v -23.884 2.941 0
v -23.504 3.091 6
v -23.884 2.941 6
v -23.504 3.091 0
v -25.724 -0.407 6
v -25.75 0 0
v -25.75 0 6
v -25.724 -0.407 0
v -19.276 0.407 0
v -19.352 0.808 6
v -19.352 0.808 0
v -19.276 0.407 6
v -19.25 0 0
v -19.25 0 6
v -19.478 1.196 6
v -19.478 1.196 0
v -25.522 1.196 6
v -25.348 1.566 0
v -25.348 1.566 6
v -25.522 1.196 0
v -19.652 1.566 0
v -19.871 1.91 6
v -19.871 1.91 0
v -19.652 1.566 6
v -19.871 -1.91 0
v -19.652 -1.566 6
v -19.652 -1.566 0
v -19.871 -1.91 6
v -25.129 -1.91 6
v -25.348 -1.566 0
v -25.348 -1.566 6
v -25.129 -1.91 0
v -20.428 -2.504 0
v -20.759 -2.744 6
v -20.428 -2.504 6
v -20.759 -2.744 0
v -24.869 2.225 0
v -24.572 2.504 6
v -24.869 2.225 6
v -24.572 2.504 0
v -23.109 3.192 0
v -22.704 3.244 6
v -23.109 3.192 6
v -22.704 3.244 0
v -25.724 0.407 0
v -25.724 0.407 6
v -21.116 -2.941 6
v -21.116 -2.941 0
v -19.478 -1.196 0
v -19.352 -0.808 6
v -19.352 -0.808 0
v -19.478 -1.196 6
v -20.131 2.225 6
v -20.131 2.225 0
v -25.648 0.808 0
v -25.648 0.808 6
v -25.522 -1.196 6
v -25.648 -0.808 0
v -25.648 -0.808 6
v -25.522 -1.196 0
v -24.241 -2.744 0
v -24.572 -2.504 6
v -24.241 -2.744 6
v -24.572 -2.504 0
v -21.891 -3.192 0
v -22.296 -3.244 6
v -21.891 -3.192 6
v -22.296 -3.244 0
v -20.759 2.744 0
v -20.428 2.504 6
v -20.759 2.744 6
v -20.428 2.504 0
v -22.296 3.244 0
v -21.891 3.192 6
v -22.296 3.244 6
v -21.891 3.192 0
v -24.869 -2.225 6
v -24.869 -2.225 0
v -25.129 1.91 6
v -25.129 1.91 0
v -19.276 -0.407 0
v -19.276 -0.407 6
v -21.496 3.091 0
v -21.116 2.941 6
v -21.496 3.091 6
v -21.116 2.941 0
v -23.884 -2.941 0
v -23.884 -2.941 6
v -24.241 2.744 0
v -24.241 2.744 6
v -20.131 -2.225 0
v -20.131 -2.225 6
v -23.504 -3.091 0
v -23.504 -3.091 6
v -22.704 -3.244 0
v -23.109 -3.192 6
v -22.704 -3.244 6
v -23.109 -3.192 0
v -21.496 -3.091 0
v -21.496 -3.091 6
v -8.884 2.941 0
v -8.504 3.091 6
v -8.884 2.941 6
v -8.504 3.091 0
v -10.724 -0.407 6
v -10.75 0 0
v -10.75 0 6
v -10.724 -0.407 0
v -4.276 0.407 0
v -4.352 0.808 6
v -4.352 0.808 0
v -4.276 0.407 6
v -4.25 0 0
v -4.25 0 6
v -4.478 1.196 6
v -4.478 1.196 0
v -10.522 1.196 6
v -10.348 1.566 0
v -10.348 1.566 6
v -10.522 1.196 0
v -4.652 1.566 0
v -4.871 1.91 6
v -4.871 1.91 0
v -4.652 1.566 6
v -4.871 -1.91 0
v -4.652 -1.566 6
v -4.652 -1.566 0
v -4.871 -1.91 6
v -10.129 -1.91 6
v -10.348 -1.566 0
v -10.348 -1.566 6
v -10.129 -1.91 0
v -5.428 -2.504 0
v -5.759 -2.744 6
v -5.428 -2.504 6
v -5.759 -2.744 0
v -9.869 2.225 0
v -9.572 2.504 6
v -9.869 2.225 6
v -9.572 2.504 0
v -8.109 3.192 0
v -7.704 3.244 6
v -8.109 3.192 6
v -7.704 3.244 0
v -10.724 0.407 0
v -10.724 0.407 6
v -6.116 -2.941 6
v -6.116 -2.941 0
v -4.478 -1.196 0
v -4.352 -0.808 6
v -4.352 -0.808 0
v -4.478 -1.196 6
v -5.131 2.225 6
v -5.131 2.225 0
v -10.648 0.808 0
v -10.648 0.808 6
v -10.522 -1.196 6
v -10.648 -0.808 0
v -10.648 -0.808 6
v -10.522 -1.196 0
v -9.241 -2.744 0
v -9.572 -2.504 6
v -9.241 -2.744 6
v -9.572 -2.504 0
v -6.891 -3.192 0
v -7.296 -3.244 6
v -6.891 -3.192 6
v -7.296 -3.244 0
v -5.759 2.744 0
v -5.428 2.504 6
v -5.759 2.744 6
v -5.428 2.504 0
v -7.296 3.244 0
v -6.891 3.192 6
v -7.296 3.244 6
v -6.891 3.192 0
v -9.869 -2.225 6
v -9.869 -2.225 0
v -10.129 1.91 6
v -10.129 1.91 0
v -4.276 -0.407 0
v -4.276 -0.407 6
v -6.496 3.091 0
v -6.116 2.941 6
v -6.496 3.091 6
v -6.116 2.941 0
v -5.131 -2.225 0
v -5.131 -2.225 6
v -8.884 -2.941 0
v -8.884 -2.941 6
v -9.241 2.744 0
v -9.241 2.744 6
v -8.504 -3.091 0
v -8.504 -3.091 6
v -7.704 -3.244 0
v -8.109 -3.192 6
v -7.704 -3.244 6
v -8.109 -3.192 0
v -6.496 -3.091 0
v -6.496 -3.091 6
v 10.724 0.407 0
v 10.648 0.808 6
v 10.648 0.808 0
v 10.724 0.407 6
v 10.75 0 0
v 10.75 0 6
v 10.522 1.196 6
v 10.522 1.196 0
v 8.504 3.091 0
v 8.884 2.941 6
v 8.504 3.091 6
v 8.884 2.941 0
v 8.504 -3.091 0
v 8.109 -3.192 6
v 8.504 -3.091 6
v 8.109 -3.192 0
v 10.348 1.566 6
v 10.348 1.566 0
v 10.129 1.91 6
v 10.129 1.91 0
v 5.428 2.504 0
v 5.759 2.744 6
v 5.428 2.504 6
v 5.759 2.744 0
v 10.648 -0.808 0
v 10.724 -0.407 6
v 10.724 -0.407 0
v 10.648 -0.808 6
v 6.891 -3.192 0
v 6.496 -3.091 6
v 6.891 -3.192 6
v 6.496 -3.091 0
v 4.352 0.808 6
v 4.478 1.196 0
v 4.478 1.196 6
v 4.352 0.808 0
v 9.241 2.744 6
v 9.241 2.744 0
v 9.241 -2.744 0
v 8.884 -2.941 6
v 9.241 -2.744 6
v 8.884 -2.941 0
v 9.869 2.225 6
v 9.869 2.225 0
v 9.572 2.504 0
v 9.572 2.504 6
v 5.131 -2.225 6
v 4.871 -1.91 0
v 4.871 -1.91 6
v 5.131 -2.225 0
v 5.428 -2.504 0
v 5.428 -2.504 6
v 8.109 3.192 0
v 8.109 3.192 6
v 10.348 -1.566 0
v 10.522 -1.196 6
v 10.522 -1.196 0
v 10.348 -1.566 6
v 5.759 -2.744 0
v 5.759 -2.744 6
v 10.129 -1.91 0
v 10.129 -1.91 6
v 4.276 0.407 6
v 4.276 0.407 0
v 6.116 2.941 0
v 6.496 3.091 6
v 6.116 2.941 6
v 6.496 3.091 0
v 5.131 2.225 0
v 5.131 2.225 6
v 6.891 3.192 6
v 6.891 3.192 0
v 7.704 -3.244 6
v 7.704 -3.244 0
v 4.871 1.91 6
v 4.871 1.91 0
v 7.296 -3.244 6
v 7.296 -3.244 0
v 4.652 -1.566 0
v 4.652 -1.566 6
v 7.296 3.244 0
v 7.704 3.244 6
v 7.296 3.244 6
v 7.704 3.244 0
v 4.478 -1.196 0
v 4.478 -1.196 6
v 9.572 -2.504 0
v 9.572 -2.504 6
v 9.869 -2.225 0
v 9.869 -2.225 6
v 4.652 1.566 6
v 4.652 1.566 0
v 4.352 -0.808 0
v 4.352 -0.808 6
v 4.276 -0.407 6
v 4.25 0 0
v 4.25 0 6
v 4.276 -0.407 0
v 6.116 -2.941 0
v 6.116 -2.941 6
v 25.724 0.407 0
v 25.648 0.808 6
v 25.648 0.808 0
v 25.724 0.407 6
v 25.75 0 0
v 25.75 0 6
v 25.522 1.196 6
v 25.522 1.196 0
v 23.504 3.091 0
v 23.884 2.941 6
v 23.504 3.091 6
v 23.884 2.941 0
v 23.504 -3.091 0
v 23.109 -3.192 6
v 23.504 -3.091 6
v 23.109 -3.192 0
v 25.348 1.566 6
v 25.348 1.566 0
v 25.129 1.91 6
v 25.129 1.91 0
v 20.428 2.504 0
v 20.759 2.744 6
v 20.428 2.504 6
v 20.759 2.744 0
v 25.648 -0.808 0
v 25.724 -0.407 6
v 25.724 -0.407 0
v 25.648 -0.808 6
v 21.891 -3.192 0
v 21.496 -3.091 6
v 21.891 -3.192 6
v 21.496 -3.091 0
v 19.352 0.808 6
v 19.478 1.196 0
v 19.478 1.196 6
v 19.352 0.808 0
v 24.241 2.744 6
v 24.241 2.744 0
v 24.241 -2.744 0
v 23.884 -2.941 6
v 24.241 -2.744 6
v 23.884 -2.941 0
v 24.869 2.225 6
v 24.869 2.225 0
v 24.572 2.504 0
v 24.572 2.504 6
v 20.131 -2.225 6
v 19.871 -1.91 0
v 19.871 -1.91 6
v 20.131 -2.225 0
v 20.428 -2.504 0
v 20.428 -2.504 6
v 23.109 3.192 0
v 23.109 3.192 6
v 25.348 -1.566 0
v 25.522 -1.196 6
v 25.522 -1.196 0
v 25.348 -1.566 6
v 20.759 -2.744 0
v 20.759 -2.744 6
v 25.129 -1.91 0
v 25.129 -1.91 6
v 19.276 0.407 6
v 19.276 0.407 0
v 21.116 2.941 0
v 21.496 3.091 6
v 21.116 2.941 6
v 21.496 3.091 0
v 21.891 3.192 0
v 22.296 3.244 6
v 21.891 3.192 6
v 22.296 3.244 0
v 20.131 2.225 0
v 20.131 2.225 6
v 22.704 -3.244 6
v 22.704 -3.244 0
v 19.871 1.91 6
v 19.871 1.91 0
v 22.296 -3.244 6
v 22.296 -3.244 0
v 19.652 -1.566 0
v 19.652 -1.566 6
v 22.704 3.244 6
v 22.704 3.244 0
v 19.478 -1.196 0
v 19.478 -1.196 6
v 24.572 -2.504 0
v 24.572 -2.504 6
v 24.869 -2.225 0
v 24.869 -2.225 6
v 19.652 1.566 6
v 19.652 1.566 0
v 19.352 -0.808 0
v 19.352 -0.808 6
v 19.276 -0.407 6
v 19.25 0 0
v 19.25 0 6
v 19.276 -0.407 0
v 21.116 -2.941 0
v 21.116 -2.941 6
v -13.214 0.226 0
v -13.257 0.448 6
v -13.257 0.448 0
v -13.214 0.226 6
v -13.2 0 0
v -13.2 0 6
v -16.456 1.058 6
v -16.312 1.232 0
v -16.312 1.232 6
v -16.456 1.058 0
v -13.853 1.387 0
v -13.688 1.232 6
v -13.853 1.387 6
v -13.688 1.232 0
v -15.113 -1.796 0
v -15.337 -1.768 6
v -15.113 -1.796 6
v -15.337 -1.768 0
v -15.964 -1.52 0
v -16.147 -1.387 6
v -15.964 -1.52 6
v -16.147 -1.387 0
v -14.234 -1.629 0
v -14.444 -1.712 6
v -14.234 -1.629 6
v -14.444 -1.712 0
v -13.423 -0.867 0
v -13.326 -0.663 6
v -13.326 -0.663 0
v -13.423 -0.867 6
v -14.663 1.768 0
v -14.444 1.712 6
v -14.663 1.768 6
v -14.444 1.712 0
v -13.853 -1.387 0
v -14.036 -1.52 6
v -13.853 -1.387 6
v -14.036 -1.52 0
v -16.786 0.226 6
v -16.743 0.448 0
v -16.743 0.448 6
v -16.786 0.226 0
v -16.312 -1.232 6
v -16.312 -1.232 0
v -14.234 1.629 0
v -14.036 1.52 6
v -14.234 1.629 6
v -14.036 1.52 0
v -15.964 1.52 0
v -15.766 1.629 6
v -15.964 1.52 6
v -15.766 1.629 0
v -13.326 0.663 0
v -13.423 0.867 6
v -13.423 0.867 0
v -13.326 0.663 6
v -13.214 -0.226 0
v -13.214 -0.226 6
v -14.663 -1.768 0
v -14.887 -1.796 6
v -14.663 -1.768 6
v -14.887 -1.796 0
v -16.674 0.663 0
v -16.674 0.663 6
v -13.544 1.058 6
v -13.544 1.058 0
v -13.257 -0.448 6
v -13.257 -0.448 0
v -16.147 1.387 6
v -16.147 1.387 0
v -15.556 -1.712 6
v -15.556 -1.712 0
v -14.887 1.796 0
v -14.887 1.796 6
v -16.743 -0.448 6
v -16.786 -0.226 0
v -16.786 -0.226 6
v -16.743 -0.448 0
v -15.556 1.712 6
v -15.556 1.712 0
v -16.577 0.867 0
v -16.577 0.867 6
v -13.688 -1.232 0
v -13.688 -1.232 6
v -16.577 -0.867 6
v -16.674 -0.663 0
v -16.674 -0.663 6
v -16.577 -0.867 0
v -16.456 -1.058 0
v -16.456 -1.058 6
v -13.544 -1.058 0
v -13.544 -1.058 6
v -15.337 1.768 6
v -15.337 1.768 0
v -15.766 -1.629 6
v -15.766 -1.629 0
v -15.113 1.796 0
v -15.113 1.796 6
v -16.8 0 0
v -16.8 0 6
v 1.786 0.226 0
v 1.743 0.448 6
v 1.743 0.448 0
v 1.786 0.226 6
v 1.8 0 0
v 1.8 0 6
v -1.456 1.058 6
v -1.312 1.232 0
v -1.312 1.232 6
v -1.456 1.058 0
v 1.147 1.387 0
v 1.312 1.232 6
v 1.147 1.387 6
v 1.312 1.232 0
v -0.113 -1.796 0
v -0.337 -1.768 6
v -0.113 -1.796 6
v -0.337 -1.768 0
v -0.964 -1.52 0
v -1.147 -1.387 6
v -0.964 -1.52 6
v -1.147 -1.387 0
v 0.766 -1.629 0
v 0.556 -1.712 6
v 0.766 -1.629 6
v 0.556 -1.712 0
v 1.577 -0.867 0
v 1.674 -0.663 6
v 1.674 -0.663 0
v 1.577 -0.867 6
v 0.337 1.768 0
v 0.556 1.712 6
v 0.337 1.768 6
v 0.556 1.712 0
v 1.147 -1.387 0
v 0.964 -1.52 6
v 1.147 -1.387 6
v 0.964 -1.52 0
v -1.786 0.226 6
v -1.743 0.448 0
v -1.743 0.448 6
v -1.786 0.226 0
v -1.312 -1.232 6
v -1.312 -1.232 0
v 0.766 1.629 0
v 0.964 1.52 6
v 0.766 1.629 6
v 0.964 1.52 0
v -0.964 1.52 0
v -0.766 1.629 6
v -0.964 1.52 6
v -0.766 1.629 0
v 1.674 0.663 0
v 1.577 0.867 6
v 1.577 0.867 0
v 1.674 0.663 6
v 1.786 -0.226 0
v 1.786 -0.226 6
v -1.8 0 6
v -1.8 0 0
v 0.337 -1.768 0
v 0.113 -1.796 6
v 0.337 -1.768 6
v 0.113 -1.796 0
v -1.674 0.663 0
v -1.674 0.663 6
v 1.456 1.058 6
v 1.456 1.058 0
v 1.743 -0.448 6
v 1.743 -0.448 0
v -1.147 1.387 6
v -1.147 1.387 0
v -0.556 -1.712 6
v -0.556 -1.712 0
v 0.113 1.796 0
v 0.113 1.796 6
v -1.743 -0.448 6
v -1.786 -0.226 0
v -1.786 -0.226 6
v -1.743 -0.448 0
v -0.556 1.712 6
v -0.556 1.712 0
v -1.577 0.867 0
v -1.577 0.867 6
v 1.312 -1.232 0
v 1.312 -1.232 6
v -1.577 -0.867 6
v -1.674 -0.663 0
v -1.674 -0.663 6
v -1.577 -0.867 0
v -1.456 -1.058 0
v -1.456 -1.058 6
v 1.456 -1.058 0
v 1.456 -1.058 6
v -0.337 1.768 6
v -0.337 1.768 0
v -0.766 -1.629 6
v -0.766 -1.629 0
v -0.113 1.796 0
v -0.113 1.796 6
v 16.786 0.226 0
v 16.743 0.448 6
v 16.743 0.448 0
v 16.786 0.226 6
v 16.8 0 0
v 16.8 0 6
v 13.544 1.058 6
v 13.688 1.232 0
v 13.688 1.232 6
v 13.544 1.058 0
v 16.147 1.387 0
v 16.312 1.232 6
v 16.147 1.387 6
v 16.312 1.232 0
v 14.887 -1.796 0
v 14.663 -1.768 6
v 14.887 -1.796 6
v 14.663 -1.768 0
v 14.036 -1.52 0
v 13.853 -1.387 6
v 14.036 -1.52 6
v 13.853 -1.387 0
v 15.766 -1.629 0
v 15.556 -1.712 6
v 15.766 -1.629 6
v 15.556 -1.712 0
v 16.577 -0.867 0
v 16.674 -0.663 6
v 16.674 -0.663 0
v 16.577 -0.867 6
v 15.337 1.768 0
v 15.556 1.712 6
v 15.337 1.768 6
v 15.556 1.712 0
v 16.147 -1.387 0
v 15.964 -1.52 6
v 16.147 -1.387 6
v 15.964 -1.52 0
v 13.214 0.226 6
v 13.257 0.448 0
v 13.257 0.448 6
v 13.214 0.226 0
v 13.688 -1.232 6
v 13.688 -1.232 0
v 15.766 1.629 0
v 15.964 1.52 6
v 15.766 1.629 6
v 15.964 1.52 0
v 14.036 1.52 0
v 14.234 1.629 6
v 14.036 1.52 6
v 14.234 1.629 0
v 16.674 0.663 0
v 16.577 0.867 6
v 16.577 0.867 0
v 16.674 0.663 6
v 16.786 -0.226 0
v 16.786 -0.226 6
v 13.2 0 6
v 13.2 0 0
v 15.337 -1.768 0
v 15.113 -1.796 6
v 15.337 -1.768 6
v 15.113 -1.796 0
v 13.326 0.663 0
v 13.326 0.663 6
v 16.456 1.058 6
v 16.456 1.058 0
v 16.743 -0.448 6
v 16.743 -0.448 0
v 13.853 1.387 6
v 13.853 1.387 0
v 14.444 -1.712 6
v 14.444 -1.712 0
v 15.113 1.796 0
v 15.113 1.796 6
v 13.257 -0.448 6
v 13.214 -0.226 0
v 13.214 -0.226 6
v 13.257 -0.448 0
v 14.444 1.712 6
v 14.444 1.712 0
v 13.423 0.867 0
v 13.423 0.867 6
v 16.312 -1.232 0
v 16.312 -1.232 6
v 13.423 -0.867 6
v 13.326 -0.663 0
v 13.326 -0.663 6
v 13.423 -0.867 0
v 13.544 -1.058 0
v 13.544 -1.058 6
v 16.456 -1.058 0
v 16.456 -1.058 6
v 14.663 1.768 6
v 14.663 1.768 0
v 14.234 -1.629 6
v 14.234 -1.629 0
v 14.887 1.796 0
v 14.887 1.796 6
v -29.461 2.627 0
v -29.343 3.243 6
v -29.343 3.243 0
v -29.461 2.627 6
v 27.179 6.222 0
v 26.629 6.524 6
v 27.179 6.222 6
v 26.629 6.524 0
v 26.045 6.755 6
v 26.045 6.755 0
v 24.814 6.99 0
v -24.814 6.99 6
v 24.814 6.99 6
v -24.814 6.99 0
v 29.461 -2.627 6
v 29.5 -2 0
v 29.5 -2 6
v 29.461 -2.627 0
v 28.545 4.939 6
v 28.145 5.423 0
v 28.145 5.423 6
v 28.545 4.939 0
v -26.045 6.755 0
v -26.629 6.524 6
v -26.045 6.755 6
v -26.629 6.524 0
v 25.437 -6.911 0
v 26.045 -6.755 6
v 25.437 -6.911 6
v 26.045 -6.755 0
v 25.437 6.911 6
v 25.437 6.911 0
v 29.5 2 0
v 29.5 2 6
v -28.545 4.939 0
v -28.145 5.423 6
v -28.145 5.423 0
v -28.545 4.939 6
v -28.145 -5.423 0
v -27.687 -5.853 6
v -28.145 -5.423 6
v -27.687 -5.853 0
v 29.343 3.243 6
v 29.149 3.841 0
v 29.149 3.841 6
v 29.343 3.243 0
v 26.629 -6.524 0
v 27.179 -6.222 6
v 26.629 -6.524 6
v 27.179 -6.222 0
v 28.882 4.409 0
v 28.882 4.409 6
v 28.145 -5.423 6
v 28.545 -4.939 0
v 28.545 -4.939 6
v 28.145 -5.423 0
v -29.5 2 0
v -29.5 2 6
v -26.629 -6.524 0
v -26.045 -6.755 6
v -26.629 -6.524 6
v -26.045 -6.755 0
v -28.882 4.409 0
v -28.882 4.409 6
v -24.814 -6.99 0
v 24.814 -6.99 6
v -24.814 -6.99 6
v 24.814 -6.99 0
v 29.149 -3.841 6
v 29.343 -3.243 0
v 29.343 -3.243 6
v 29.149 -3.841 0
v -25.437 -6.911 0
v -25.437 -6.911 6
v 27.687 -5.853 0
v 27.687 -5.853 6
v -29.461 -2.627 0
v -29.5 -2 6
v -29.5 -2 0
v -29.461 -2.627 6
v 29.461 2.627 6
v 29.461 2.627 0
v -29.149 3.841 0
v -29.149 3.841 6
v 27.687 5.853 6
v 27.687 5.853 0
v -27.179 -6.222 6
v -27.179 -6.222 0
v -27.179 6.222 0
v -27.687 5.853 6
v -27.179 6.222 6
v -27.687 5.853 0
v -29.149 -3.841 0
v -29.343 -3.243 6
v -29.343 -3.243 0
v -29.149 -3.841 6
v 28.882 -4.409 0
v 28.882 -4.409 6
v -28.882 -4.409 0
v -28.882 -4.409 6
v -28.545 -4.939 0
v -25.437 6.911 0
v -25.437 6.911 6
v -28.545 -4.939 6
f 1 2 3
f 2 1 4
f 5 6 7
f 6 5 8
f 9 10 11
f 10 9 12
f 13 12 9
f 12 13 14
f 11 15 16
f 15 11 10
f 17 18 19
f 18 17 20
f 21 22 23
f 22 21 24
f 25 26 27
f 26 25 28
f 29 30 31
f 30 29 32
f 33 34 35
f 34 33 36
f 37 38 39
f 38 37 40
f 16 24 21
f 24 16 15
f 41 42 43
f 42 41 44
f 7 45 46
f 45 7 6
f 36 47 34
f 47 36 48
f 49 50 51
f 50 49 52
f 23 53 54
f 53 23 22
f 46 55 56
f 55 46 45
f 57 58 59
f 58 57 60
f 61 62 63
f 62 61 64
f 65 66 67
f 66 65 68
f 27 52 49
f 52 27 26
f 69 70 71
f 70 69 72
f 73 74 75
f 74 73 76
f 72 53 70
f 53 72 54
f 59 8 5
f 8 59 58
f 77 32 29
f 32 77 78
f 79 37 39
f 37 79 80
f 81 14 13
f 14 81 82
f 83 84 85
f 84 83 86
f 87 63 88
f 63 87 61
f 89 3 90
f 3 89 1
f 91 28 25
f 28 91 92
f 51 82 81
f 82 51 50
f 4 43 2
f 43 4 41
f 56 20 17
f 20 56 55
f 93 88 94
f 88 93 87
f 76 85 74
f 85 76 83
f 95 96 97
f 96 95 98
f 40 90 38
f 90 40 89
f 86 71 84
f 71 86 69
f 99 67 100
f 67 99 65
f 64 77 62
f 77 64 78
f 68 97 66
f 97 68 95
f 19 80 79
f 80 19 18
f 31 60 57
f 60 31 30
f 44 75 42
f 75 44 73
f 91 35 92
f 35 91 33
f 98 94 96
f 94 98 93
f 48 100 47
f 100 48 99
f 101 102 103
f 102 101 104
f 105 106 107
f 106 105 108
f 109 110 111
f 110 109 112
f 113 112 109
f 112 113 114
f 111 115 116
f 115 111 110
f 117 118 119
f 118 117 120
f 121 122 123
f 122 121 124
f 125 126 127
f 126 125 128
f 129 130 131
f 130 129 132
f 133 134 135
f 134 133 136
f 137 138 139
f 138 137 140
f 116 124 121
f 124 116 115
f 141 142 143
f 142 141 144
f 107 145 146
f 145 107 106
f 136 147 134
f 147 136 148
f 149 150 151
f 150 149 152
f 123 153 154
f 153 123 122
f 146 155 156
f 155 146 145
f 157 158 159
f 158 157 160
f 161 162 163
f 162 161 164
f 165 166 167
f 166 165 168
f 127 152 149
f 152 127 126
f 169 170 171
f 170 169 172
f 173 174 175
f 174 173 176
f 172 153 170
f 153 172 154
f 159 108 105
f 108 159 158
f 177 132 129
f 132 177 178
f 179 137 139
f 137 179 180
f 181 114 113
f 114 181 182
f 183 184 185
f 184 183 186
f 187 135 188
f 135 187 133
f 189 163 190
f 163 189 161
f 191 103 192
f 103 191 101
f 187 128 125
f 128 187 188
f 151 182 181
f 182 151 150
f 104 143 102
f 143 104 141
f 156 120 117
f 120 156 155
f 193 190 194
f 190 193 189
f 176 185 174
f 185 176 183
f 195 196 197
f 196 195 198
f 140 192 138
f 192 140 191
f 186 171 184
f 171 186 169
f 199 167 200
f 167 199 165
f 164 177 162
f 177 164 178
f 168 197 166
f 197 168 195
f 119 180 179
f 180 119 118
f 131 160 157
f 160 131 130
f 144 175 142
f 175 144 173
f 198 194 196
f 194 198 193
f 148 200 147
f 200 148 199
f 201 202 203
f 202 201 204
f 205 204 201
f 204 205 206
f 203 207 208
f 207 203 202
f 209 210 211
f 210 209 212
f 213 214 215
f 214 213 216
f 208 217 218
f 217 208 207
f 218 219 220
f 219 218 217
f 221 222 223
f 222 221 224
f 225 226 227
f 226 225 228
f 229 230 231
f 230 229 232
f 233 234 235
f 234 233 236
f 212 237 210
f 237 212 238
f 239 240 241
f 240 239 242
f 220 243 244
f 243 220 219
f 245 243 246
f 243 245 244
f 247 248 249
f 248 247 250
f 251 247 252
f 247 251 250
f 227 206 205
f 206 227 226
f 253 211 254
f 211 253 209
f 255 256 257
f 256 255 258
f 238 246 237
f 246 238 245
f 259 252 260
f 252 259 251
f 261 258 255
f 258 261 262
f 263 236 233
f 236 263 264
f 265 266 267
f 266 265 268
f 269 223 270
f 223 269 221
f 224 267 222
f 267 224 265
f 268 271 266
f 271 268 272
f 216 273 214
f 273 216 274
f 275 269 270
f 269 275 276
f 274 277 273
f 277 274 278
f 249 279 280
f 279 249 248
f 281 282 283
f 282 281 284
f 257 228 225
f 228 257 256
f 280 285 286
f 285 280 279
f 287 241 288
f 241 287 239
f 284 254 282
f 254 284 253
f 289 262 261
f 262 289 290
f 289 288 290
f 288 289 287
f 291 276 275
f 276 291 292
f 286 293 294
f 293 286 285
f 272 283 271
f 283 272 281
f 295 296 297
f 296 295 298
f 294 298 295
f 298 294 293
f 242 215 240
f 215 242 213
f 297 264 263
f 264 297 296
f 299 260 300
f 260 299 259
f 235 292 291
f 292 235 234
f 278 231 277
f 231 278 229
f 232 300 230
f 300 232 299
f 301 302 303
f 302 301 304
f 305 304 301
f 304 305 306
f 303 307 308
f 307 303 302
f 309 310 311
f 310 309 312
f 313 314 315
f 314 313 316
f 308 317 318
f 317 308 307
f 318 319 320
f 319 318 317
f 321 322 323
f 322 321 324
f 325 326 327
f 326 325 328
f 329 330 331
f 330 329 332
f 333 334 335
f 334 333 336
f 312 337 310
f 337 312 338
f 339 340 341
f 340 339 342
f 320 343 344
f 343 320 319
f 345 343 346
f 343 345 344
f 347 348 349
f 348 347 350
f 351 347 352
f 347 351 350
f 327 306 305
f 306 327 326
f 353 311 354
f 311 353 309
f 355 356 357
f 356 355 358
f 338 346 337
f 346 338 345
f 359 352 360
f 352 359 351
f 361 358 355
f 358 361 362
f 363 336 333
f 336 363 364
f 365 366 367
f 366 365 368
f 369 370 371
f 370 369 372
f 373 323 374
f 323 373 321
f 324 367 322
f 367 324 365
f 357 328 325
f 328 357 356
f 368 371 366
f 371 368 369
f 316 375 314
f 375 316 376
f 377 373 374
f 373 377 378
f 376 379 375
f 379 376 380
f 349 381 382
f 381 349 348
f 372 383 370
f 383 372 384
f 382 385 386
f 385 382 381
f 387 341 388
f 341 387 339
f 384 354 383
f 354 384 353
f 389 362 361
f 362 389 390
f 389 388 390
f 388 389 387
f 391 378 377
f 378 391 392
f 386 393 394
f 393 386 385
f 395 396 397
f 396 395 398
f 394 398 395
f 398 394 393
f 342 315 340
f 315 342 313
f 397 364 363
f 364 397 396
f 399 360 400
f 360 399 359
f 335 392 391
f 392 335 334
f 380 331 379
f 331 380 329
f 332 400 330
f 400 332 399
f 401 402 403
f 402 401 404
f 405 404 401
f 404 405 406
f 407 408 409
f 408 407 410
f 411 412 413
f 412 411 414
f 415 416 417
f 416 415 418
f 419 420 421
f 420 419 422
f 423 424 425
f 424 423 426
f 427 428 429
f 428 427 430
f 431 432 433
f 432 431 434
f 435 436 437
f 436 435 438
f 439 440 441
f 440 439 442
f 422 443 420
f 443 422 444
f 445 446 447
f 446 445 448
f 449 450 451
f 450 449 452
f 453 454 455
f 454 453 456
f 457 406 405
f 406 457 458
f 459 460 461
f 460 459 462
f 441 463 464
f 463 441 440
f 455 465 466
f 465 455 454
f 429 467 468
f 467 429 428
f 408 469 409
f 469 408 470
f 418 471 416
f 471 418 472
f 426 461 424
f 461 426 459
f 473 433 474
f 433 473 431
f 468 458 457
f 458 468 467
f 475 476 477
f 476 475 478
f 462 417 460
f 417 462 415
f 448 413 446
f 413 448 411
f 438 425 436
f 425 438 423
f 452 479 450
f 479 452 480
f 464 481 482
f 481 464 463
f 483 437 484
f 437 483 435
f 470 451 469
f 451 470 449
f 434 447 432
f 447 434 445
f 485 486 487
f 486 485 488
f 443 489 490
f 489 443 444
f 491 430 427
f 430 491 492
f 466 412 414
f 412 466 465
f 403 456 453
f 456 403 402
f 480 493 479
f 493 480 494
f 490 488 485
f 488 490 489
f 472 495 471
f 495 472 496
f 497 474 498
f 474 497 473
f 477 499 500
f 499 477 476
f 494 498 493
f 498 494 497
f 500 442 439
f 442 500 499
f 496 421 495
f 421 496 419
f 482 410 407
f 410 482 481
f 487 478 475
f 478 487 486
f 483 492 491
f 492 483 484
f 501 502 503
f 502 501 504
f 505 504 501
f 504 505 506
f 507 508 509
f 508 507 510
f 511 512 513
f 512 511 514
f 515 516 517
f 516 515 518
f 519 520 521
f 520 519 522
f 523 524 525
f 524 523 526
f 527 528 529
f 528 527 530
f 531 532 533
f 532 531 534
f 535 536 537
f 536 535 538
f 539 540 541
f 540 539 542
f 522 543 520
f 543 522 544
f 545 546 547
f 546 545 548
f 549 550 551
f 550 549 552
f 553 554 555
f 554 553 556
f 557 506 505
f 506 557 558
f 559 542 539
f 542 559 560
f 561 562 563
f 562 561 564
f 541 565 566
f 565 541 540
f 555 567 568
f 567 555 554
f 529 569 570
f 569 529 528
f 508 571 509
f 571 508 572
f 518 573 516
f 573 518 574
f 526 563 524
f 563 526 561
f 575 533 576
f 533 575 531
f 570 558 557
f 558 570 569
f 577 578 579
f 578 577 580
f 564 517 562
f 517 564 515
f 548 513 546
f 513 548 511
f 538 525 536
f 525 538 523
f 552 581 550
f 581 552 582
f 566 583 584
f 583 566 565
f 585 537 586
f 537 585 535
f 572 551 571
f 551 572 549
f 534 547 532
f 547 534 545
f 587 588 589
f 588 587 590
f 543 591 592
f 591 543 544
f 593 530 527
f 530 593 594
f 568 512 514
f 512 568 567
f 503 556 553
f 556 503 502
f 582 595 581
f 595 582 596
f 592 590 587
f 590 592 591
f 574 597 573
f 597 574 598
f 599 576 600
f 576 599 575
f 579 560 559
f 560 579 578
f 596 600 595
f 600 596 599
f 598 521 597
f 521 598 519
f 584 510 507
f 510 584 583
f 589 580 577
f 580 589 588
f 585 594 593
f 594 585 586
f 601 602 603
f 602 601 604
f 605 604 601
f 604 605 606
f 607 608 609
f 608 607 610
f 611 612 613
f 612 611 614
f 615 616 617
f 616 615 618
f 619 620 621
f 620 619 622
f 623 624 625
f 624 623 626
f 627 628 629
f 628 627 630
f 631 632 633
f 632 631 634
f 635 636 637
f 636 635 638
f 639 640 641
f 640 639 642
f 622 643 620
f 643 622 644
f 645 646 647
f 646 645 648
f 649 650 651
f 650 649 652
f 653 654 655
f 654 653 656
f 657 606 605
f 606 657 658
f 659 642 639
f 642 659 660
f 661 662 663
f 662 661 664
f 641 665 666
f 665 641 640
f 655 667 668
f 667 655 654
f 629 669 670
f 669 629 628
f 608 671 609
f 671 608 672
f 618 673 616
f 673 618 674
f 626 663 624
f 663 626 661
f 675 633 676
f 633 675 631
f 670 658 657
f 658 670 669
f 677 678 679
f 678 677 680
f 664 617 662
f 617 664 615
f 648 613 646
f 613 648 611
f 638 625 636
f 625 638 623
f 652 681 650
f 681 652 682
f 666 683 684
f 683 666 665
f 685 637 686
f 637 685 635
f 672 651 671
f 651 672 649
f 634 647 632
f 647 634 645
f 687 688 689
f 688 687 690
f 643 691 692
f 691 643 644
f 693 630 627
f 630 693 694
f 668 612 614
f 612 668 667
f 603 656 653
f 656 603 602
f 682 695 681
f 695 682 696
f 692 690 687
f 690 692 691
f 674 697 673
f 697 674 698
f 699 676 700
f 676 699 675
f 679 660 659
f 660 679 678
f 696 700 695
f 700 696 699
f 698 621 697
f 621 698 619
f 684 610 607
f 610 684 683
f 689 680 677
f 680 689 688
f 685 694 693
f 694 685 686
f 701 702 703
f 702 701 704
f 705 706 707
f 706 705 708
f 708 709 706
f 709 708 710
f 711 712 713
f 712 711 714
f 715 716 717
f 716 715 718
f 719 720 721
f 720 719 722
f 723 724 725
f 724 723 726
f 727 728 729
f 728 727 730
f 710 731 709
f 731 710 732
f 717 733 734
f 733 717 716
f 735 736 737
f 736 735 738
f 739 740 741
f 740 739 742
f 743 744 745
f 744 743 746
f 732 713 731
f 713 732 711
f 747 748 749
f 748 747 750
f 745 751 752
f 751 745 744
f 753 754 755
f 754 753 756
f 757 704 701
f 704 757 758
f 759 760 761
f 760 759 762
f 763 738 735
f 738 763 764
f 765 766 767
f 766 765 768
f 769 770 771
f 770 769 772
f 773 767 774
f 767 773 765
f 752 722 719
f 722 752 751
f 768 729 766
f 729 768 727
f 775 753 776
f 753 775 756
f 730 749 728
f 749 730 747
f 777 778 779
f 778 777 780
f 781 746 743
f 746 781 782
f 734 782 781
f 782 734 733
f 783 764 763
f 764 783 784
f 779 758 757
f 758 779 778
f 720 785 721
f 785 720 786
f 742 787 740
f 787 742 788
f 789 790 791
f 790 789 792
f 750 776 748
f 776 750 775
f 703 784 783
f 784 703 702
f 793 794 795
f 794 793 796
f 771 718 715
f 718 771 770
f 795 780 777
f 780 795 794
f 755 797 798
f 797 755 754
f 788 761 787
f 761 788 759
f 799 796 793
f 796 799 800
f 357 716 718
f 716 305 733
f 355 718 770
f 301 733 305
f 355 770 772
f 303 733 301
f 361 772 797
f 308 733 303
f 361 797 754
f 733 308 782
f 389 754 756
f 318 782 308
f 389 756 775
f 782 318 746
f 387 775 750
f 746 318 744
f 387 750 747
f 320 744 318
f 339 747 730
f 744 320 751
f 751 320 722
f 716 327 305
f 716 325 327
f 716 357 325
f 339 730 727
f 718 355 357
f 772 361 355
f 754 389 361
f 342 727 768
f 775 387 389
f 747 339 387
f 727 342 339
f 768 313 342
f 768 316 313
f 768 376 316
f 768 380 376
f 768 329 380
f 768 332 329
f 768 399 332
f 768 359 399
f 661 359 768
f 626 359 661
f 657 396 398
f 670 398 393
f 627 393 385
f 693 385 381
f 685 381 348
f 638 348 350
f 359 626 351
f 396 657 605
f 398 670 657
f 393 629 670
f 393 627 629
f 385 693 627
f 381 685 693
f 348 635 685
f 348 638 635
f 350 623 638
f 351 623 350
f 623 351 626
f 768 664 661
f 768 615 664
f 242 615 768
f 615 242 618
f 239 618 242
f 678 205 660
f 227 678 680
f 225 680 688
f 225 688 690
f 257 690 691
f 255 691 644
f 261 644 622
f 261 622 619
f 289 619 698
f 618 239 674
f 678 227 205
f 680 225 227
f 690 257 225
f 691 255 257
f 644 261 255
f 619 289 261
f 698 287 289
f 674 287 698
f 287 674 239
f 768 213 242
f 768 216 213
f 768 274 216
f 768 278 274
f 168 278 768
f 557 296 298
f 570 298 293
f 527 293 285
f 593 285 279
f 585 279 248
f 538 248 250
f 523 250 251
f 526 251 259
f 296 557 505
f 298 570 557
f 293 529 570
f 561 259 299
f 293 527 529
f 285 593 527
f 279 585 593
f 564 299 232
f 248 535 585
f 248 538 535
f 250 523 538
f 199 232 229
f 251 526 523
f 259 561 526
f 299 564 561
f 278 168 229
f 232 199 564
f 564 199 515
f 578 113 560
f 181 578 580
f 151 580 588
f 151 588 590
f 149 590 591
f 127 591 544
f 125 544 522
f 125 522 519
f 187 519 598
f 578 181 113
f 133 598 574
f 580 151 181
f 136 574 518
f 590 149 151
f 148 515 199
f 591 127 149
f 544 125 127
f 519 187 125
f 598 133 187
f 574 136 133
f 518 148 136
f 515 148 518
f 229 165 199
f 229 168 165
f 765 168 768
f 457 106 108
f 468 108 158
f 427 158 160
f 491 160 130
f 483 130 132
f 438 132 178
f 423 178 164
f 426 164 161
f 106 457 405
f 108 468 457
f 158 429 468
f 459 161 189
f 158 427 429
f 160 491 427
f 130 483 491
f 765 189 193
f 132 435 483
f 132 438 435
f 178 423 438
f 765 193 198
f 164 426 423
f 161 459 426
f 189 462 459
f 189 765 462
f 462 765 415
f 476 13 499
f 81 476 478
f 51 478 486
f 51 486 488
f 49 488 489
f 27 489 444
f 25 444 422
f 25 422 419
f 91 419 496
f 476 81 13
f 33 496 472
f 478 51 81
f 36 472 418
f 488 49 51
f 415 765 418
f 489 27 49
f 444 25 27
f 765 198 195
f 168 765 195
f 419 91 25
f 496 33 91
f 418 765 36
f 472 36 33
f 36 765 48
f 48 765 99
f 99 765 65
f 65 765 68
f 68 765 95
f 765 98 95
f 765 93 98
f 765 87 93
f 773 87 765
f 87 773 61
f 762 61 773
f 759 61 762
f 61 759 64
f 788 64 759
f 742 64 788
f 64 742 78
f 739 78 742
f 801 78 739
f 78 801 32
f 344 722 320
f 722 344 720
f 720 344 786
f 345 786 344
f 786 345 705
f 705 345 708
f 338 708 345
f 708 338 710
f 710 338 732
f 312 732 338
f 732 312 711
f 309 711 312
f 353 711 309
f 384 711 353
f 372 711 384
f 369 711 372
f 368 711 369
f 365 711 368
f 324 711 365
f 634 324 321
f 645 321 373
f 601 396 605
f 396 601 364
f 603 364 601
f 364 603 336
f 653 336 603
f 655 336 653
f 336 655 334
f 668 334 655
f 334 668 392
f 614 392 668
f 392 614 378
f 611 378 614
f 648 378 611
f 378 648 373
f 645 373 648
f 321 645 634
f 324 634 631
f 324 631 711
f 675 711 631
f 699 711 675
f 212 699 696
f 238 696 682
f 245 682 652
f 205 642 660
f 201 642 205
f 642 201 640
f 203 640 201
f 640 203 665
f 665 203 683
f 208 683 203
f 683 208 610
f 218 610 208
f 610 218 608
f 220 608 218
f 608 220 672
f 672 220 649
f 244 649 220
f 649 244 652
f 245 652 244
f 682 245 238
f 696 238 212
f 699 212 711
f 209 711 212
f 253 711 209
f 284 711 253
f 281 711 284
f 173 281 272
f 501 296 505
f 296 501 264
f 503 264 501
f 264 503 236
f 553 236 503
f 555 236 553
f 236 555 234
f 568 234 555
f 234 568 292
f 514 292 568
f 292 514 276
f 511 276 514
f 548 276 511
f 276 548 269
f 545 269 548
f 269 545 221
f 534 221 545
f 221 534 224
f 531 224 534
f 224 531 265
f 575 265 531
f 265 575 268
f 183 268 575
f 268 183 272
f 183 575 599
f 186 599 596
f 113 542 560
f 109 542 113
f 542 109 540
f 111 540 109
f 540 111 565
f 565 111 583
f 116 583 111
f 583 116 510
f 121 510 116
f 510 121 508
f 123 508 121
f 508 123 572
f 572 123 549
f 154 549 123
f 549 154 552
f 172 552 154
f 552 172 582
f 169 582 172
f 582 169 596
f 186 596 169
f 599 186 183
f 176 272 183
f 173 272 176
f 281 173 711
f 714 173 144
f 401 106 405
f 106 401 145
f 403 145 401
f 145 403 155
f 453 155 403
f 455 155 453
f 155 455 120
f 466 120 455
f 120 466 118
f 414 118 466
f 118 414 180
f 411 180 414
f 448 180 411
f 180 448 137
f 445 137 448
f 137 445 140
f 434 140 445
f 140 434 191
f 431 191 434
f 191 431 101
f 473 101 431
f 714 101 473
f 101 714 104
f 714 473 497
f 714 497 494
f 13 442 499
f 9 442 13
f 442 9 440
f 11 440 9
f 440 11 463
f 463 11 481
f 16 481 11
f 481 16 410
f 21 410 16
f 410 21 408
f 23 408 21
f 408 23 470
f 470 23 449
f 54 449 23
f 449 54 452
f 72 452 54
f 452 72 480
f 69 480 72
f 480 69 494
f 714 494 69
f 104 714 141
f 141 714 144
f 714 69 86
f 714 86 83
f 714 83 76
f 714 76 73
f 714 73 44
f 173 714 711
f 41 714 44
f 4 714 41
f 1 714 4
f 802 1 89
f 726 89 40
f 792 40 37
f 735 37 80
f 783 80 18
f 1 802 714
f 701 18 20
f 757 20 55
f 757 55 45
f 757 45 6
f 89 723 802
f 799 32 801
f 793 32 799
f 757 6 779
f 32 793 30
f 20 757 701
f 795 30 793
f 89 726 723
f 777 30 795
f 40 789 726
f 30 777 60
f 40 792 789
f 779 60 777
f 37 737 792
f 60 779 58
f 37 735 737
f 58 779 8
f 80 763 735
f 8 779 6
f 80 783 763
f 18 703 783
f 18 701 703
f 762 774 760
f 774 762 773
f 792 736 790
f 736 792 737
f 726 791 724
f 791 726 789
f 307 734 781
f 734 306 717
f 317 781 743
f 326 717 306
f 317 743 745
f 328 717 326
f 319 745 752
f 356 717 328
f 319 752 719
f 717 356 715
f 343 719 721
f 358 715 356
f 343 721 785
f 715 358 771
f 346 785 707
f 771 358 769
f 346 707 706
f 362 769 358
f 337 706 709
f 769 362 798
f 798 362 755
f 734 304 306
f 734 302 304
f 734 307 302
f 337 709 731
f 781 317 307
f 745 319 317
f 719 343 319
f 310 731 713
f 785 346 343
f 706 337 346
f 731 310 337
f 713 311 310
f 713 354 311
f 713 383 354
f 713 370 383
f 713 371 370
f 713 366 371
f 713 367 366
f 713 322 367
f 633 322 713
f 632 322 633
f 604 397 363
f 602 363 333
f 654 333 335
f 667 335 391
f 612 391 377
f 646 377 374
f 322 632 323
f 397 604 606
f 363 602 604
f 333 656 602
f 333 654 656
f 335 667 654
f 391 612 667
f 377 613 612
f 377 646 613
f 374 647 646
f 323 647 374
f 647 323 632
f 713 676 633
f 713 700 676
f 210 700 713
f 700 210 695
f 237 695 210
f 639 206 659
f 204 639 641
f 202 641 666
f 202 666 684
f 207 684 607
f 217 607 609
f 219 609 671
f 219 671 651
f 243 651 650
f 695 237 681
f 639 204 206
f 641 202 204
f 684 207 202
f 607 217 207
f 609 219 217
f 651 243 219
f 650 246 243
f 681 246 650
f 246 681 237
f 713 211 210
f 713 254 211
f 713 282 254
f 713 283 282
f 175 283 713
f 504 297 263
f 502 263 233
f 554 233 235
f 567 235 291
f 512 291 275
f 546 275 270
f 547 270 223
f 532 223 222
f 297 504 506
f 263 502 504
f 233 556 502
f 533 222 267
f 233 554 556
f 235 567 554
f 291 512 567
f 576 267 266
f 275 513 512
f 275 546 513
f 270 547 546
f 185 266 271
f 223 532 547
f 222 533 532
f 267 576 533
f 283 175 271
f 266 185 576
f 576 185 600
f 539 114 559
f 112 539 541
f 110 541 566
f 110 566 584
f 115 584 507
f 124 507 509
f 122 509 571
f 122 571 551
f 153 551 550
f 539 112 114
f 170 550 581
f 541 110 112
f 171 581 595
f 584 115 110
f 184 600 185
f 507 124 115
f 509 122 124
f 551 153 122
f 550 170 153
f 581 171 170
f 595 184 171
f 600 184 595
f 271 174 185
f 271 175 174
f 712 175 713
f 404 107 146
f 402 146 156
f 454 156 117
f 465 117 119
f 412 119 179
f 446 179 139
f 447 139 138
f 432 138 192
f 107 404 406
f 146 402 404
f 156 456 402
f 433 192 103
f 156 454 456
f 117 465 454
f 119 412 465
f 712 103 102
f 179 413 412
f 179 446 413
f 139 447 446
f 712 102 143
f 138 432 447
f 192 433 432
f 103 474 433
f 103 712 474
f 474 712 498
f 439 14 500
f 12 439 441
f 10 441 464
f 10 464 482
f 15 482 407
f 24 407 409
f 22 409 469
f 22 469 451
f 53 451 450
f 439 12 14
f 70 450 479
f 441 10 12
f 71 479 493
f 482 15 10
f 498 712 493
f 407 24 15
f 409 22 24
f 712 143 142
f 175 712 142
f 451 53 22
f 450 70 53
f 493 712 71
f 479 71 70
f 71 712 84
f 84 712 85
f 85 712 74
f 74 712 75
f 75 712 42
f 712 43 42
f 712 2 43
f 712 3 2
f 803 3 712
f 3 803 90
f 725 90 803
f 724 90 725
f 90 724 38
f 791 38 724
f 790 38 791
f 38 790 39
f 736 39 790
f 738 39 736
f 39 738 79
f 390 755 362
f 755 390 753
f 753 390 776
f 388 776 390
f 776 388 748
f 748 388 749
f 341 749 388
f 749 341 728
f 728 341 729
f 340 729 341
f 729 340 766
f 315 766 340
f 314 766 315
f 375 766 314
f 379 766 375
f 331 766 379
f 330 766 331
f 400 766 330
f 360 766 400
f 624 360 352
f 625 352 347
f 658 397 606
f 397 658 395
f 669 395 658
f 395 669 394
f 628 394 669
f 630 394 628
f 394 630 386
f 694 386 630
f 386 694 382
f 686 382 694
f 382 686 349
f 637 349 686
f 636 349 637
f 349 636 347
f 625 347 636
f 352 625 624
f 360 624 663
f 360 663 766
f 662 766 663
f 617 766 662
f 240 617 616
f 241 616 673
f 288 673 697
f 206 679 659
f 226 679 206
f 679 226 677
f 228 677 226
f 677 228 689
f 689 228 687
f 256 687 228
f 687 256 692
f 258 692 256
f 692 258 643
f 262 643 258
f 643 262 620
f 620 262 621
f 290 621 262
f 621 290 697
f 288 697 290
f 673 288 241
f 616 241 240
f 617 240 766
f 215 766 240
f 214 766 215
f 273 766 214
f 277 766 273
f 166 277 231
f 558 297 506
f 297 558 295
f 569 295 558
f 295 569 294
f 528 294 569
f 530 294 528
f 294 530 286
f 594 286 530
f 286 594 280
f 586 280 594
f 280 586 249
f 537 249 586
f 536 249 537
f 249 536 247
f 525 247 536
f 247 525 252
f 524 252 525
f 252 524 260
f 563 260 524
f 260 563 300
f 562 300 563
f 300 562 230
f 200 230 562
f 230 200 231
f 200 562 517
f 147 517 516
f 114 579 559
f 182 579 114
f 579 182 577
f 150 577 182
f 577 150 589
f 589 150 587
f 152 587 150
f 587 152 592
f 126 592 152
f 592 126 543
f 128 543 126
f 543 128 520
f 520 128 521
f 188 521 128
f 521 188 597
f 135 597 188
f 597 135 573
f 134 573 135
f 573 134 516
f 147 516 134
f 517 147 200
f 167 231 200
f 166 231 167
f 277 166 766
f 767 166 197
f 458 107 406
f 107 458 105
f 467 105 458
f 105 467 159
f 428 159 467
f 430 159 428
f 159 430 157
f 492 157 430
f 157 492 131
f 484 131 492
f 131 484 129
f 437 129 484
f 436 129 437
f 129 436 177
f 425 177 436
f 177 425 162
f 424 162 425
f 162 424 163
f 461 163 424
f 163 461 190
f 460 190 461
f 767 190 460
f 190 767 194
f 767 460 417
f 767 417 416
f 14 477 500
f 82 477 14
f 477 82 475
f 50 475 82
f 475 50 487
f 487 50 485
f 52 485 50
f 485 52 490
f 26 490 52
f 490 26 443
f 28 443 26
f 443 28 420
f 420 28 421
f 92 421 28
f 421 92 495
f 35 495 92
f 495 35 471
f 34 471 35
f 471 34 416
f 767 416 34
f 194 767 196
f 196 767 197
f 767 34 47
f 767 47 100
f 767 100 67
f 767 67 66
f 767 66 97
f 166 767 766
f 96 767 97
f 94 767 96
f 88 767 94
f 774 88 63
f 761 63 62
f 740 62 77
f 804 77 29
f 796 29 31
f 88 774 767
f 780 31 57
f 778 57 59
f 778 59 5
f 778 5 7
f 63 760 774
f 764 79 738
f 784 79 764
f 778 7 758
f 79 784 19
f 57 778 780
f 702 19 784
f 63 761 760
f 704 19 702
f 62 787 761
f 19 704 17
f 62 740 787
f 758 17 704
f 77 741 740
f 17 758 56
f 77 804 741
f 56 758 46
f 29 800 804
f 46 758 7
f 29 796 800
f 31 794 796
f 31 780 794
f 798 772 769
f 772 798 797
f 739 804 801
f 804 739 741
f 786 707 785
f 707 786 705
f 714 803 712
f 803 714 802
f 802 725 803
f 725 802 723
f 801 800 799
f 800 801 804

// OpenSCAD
$fn = 50;


difference() {
	union() {
		*color(alpha = 1.0000000000, c = "gray") {
			translate(v = [0, 7, 0]) {
				linear_extrude(height = 1) {
					text(font = "Arial:style=Bold", halign = "center", size = 4.5000000000, text = "COMMENT plate main", valign = "center");
				}
			}
		}
		hull() {
			translate(v = [-24.5000000000, 2.0000000000, 0]) {
				cylinder(h = 6, r = 5);
			}
			translate(v = [24.5000000000, 2.0000000000, 0]) {
				cylinder(h = 6, r = 5);
			}
			translate(v = [-24.5000000000, -2.0000000000, 0]) {
				cylinder(h = 6, r = 5);
			}
			translate(v = [24.5000000000, -2.0000000000, 0]) {
				cylinder(h = 6, r = 5);
			}
		}
	}
	union() {
		*color(alpha = 1.0000000000, c = "gray") {
			translate(v = [0, 7, 0]) {
				linear_extrude(height = 1) {
					text(font = "Arial:style=Bold", halign = "center", size = 4.5000000000, text = "COMMENT holes main", valign = "center");
				}
			}
		}
		translate(v = [-22.5000000000, 0.0000000000, 0]) {
			translate(v = [0, 0, -100]) {
				cylinder(h = 200, r = 3.2500000000);
			}
		}
		translate(v = [-7.5000000000, 0.0000000000, 0]) {
			translate(v = [0, 0, -100]) {
				cylinder(h = 200, r = 3.2500000000);
			}
		}
		translate(v = [7.5000000000, 0.0000000000, 0]) {
			translate(v = [0, 0, -100]) {
				cylinder(h = 200, r = 3.2500000000);
			}
		}
		translate(v = [22.5000000000, 0.0000000000, 0]) {
			translate(v = [0, 0, -100]) {
				cylinder(h = 200, r = 3.2500000000);
			}
		}
		translate(v = [-22.5000000000, 0.0000000000, 0]) {
			translate(v = [0, 0, -100]) {
				cylinder(h = 200, r = 1.8000000000);
			}
		}
		translate(v = [-15.0000000000, 0.0000000000, 0]) {
			translate(v = [0, 0, -100]) {
				cylinder(h = 200, r = 1.8000000000);
			}
		}
		translate(v = [-7.5000000000, 0.0000000000, 0]) {
			translate(v = [0, 0, -100]) {
				cylinder(h = 200, r = 1.8000000000);
			}
		}
		translate(v = [0, 0, -100]) {
			cylinder(h = 200, r = 1.8000000000);
		}
		translate(v = [7.5000000000, 0.0000000000, 0]) {
			translate(v = [0, 0, -100]) {
				cylinder(h = 200, r = 1.8000000000);
			}
		}
		translate(v = [15.0000000000, 0.0000000000, 0]) {
			translate(v = [0, 0, -100]) {
				cylinder(h = 200, r = 1.8000000000);
			}
		}
		translate(v = [22.5000000000, 0.0000000000, 0]) {
			translate(v = [0, 0, -100]) {
				cylinder(h = 200, r = 1.8000000000);
			}
		}
	}
}
